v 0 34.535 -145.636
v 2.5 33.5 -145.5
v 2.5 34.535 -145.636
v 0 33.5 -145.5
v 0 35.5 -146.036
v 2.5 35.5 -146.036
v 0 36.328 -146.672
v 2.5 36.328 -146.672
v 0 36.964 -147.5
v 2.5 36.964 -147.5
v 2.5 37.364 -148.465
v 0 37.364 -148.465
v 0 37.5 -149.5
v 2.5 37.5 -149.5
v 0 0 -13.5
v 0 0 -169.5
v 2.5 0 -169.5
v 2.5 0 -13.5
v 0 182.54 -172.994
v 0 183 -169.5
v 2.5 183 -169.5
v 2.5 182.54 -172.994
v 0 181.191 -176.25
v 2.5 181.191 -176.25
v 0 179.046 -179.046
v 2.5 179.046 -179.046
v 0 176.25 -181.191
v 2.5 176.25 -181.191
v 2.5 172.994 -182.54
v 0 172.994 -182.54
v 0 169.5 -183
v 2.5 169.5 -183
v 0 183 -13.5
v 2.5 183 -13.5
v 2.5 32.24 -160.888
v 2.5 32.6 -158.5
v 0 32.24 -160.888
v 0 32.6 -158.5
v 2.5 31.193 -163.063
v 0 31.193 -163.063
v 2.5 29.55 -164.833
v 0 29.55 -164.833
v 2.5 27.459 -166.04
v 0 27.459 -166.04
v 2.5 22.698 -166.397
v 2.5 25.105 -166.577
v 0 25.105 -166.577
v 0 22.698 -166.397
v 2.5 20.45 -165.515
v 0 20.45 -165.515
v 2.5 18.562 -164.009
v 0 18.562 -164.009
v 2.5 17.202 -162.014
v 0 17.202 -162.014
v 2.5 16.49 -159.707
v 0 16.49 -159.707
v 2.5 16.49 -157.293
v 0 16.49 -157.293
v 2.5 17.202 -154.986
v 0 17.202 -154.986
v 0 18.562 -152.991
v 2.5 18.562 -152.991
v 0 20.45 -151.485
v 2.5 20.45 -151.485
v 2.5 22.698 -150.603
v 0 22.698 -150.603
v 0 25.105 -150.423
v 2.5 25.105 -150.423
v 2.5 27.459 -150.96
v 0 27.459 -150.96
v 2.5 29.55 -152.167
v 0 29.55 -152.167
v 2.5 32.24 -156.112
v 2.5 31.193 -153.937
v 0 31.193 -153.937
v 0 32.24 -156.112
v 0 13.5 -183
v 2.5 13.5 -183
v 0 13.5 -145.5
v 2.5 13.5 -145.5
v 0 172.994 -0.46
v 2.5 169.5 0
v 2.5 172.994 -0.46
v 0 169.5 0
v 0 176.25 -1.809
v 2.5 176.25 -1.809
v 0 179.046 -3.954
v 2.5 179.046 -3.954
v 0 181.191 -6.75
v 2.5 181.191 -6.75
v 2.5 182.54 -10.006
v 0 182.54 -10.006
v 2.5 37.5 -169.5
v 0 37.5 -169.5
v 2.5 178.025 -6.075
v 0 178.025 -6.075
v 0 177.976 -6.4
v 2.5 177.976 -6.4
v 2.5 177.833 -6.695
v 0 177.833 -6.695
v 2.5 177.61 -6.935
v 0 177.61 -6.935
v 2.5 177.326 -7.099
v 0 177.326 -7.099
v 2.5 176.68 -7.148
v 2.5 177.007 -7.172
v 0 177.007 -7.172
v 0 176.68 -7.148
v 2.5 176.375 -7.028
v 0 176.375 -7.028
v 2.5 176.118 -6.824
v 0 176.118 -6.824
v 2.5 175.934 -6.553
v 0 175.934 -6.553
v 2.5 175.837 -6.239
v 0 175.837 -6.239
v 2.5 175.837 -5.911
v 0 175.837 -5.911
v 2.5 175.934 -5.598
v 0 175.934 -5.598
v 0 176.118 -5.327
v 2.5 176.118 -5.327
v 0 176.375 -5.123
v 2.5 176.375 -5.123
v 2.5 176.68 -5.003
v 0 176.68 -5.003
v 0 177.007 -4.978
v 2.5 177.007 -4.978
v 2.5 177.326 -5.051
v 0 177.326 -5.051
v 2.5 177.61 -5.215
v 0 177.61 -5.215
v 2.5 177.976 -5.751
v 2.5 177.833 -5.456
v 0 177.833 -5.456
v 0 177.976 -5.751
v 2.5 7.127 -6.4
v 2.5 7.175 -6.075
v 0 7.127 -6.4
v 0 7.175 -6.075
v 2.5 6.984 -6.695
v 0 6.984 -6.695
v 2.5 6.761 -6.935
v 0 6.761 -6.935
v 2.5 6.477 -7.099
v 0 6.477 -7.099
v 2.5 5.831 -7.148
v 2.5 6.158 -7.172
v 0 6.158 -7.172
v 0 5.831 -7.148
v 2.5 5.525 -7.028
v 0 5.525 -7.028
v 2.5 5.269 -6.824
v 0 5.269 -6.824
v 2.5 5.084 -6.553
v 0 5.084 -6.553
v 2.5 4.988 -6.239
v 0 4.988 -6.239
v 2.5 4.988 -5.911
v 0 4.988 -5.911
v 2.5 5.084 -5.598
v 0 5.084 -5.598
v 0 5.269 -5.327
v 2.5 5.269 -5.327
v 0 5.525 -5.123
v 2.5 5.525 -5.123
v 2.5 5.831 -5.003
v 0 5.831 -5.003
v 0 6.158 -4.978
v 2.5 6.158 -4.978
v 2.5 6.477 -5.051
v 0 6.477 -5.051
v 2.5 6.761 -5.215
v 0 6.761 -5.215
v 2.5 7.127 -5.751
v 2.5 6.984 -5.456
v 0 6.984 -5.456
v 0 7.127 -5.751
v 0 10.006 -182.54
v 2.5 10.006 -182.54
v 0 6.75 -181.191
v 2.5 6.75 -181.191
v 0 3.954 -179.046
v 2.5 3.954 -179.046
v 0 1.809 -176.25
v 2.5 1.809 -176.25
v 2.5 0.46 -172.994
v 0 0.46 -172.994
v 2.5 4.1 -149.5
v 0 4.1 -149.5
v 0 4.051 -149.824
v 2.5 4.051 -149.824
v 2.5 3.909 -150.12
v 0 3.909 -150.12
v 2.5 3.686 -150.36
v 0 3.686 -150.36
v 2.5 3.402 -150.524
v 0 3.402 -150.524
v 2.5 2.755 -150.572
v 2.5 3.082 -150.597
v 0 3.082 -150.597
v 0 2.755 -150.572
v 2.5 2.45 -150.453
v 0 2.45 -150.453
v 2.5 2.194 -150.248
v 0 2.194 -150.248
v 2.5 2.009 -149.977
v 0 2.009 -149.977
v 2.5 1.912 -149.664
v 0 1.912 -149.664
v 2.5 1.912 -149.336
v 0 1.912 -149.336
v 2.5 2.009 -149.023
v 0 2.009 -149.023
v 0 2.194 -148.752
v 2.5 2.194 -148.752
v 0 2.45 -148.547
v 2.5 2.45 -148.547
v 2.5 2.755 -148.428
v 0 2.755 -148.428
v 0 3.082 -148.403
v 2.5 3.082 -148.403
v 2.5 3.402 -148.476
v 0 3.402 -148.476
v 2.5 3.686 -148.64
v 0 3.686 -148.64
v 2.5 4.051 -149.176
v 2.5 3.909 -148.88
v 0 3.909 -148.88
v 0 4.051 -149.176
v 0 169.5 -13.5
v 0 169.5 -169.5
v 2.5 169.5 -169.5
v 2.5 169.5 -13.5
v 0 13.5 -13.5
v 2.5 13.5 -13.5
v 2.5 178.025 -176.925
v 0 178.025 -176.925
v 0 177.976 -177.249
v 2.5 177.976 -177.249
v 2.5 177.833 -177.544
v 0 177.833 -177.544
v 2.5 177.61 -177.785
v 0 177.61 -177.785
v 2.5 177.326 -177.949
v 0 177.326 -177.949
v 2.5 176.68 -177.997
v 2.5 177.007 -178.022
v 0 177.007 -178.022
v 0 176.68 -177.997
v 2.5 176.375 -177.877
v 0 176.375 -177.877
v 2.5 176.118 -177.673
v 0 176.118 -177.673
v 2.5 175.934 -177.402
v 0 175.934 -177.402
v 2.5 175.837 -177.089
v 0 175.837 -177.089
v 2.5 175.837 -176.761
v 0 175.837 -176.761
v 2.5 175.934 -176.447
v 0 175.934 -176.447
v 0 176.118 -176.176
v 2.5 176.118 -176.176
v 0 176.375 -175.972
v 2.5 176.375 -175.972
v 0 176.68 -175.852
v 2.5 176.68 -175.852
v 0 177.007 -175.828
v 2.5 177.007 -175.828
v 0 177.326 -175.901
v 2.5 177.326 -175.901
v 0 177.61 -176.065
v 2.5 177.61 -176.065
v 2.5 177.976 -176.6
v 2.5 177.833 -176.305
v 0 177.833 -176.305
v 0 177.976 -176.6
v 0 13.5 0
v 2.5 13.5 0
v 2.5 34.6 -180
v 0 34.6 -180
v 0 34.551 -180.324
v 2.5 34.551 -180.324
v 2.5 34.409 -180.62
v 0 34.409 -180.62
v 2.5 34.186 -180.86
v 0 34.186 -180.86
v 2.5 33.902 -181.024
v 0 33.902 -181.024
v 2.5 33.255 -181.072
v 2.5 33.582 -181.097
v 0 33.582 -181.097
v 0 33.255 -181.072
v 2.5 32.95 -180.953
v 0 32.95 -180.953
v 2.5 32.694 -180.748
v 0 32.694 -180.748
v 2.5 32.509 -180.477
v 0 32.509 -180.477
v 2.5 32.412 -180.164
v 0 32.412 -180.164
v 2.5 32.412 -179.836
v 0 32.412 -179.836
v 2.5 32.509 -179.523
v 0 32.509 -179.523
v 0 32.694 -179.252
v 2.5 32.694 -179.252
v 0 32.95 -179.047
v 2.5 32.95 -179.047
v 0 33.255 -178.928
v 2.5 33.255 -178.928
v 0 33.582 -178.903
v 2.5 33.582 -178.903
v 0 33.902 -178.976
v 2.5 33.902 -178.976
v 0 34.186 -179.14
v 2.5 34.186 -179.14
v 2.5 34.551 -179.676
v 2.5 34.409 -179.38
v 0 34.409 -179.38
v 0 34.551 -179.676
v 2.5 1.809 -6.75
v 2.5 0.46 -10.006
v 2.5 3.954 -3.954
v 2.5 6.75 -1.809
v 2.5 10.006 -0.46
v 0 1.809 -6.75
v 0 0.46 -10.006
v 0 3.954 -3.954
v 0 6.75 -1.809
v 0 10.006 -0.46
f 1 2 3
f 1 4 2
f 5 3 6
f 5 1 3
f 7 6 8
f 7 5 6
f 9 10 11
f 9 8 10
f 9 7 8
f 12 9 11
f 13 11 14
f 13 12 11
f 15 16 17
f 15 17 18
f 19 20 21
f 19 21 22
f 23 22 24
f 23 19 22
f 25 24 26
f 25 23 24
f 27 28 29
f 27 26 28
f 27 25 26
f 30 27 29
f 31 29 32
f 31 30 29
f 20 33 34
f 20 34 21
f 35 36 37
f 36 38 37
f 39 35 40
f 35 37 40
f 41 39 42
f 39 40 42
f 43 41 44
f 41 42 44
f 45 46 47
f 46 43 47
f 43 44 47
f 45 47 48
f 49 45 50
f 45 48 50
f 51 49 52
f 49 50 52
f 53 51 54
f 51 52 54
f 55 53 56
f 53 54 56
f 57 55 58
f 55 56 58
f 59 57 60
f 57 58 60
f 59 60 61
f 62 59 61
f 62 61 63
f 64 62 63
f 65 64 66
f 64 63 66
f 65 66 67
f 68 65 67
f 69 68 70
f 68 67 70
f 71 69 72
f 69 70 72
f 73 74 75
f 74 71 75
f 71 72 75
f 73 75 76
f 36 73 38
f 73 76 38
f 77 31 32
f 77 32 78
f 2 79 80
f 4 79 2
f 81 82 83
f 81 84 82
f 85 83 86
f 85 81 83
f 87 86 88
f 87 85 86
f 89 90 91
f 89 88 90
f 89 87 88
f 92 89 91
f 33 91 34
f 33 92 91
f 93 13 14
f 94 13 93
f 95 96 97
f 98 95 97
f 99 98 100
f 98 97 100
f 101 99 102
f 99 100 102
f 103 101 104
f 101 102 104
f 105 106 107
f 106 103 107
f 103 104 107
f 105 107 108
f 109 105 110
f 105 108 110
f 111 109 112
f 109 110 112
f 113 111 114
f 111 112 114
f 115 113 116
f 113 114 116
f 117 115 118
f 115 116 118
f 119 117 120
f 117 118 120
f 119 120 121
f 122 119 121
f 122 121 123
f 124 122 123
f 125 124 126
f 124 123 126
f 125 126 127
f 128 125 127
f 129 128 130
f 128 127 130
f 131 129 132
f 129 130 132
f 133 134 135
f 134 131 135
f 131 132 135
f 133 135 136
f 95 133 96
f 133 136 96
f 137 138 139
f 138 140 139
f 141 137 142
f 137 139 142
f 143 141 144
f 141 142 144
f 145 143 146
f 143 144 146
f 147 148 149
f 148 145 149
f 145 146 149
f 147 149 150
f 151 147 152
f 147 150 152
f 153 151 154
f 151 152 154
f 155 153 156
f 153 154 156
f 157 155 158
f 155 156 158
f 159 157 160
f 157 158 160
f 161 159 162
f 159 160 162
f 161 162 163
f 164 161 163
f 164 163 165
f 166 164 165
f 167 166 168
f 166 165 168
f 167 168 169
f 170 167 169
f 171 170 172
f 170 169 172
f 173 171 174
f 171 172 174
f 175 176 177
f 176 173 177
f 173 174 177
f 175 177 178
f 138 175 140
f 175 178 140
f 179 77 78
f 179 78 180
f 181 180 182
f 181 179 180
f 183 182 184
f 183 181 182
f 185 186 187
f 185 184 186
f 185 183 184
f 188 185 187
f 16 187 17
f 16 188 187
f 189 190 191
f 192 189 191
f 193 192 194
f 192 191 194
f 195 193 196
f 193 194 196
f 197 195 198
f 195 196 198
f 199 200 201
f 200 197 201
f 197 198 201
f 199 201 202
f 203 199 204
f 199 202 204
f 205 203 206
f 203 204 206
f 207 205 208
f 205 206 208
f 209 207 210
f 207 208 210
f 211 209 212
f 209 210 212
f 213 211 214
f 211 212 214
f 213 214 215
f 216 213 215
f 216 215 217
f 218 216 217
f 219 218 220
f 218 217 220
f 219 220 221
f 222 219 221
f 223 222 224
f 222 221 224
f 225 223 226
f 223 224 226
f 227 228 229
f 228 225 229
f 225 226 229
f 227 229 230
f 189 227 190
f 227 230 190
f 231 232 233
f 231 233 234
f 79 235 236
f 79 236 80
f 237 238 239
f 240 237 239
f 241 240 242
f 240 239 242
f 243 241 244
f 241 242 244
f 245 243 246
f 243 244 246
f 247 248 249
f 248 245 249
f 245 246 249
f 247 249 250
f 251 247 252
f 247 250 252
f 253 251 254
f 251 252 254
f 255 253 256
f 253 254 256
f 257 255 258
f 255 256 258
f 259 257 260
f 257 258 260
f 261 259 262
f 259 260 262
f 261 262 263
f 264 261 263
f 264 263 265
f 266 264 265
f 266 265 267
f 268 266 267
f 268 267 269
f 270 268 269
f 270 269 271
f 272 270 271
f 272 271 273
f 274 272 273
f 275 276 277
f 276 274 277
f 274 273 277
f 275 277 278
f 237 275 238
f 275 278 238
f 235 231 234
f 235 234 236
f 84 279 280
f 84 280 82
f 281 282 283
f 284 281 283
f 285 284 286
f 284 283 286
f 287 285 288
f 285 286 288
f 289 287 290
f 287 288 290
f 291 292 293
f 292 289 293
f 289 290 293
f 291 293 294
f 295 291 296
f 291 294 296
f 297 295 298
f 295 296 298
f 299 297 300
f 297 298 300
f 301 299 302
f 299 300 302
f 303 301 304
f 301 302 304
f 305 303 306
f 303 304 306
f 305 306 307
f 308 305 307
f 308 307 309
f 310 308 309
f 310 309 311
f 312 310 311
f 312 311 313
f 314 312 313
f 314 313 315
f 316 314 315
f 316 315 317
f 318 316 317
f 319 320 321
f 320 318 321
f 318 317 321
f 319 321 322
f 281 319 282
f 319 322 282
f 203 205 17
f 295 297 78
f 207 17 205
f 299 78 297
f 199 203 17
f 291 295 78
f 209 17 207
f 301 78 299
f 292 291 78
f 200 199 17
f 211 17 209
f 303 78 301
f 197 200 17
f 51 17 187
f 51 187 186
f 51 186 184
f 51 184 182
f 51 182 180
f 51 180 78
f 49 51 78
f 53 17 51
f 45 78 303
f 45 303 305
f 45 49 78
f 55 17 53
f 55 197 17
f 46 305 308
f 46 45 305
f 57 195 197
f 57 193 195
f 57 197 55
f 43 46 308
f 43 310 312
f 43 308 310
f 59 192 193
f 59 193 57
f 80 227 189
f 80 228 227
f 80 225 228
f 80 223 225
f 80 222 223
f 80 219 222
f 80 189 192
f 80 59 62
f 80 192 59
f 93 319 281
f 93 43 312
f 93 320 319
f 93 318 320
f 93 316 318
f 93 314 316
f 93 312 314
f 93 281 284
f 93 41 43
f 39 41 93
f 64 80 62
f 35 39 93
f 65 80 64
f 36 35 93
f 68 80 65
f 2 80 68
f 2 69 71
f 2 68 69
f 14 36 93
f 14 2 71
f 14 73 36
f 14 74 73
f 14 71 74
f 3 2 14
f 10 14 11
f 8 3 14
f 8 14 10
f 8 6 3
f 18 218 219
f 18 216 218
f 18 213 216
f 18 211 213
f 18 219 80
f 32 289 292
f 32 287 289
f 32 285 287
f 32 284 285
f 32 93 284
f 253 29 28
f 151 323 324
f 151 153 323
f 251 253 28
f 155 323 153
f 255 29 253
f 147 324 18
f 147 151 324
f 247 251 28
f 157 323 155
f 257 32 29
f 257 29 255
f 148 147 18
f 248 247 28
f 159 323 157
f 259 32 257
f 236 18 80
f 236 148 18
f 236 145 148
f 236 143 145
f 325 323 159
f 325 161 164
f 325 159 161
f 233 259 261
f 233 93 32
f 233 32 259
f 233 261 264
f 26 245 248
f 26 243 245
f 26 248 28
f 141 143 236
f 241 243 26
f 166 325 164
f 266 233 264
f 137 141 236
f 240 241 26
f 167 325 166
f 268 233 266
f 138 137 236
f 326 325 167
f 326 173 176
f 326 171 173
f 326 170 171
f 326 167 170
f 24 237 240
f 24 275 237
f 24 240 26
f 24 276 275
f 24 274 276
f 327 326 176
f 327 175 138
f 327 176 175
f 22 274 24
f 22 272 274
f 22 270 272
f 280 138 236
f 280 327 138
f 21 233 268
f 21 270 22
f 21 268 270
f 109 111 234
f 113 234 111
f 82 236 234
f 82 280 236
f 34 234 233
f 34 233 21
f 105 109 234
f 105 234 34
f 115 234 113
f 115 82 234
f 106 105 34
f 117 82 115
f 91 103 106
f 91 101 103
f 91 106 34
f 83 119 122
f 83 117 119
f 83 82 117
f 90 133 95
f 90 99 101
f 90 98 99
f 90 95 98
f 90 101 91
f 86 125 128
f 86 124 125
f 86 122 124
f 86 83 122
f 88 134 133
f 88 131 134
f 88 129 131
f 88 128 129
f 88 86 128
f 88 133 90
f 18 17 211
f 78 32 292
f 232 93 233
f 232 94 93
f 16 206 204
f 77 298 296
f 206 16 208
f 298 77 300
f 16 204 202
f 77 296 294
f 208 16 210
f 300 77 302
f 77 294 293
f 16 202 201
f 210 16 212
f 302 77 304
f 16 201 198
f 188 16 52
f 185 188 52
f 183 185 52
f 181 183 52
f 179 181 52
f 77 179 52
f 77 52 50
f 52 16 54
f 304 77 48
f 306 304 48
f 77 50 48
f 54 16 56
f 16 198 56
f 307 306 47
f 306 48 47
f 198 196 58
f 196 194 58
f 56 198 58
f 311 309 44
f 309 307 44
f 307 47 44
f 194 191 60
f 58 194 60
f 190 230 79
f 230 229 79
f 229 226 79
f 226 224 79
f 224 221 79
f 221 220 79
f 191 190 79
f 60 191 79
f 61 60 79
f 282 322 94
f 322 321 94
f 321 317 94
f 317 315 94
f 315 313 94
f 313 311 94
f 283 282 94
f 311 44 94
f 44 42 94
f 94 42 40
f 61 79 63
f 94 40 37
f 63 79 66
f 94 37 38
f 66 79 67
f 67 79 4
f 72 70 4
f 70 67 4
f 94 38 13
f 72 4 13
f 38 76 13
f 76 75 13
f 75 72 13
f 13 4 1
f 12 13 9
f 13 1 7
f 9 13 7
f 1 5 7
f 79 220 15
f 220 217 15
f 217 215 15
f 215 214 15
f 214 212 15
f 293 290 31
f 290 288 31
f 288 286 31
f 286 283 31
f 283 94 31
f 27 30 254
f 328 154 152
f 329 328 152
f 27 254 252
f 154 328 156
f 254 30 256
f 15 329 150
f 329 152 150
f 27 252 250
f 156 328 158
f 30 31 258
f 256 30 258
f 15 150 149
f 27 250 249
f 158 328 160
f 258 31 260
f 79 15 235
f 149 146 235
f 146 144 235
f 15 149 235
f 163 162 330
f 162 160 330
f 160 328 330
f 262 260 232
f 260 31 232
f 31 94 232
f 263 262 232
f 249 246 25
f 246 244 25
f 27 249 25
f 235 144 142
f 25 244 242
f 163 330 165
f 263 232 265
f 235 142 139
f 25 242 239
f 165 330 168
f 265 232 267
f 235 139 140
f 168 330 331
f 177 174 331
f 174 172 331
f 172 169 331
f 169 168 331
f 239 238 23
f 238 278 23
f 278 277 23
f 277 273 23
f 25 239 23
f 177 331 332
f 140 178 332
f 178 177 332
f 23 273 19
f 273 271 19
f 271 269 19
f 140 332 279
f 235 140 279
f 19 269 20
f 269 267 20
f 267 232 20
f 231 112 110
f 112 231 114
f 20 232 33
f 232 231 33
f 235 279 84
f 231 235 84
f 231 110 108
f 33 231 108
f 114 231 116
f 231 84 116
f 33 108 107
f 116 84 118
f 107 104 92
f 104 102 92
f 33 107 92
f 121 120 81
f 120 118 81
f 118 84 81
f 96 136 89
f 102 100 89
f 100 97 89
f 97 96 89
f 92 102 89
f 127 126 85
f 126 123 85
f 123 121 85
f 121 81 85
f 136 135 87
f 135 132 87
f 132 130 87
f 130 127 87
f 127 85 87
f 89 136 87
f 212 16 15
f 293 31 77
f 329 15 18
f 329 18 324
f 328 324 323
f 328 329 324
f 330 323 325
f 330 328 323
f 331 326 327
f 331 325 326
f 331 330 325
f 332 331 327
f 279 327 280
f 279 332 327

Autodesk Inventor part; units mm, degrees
ref_plane "YZ Plane" through (0, 0, 0) normal (1, 0, 0) x (0, 1, 0)
ref_plane "XZ Plane" through (0, 0, 0) normal (0, 1, 0) x (-1, 0, 0)
ref_plane "XY Plane" through (0, 0, 0) normal (0, 0, 1) x (1, 0, 0)
sketch "Sketch1" plane through (0, 0, 0) normal (1, 0, 0) x (0, 1, 0)
  line L0 (13.5, 0) -> (169.5, 0)
  line L1 (183, -13.5) -> (183, -169.5)
  line L2 (169.5, -183) -> (13.5, -183)
  line L3 (0, -169.5) -> (0, -13.5)
  arc A0 (183, -13.5) -> (169.5, 0) centre (169.5, -13.5) ccw
  arc A1 (169.5, -183) -> (183, -169.5) centre (169.5, -169.5) ccw
  arc A2 (0, -169.5) -> (13.5, -183) centre (13.5, -169.5) ccw
  arc A3 (13.5, 0) -> (0, -13.5) centre (13.5, -13.5) ccw
  line L4 (169.5, -13.5) -> (13.5, -13.5)
  line L5 (13.5, -13.5) -> (13.5, -145.5)
  line L6 (37.5, -169.5) -> (169.5, -169.5)
  line L7 (169.5, -169.5) -> (169.5, -13.5)
  line L8 (169.5, -13.5) -> (179.0459, -3.9541) construction
  line L9 (169.5, -169.5) -> (179.0459, -179.0459) construction
  line L10 (13.5, -13.5) -> (3.9541, -3.9541) construction
  line L11 (33.0959, -149.5) -> (0, -149.5) construction
  line L12 (33.5, -149.9041) -> (33.5, -183) construction
  circle A4 centre (6.0754, -6.0754) radius 3 construction
  circle A5 centre (6.0754, -6.0754) radius 1.1
  circle A6 centre (176.9246, -6.0754) radius 3 construction
  circle A7 centre (176.9246, -6.0754) radius 1.1
  circle A8 centre (176.9246, -176.9246) radius 3 construction
  circle A9 centre (176.9246, -176.9246) radius 1.1
  circle A10 centre (33.5, -180) radius 3 construction
  circle A11 centre (33.5, -180) radius 1.1
  circle A12 centre (3, -149.5) radius 3 construction
  circle A13 centre (3, -149.5) radius 1.1
  line L13 (13.5, -169.5) -> (24.5, -158.5) construction
  circle A14 centre (24.5, -158.5) radius 8.1
  line L14 (13.5, -145.5) -> (33.5, -145.5)
  line L15 (37.5, -149.5) -> (37.5, -169.5)
  arc A15 (37.5, -149.5) -> (33.5, -145.5) centre (33.5, -149.5) ccw
  point P0 (0, 0)
  point P1 (37.5, -145.5)
  dimension "d6" = 6
  dimension "d0" = 13.5
  dimension "d1" = 183
  dimension "d2" = 183
  dimension "d3" = 20
  dimension "d4" = 20
  dimension "d5" = 2.2
  dimension "d10" = 16.2
  dimension "d11" = 24.5
  dimension "d12" = 45
  dimension "d13" = 24
  dimension "d14" = 4
extrude "Extrusion1" add sketch "Sketch1" along normal blind 2.5
properties part number "FrontPanelSquishything"
